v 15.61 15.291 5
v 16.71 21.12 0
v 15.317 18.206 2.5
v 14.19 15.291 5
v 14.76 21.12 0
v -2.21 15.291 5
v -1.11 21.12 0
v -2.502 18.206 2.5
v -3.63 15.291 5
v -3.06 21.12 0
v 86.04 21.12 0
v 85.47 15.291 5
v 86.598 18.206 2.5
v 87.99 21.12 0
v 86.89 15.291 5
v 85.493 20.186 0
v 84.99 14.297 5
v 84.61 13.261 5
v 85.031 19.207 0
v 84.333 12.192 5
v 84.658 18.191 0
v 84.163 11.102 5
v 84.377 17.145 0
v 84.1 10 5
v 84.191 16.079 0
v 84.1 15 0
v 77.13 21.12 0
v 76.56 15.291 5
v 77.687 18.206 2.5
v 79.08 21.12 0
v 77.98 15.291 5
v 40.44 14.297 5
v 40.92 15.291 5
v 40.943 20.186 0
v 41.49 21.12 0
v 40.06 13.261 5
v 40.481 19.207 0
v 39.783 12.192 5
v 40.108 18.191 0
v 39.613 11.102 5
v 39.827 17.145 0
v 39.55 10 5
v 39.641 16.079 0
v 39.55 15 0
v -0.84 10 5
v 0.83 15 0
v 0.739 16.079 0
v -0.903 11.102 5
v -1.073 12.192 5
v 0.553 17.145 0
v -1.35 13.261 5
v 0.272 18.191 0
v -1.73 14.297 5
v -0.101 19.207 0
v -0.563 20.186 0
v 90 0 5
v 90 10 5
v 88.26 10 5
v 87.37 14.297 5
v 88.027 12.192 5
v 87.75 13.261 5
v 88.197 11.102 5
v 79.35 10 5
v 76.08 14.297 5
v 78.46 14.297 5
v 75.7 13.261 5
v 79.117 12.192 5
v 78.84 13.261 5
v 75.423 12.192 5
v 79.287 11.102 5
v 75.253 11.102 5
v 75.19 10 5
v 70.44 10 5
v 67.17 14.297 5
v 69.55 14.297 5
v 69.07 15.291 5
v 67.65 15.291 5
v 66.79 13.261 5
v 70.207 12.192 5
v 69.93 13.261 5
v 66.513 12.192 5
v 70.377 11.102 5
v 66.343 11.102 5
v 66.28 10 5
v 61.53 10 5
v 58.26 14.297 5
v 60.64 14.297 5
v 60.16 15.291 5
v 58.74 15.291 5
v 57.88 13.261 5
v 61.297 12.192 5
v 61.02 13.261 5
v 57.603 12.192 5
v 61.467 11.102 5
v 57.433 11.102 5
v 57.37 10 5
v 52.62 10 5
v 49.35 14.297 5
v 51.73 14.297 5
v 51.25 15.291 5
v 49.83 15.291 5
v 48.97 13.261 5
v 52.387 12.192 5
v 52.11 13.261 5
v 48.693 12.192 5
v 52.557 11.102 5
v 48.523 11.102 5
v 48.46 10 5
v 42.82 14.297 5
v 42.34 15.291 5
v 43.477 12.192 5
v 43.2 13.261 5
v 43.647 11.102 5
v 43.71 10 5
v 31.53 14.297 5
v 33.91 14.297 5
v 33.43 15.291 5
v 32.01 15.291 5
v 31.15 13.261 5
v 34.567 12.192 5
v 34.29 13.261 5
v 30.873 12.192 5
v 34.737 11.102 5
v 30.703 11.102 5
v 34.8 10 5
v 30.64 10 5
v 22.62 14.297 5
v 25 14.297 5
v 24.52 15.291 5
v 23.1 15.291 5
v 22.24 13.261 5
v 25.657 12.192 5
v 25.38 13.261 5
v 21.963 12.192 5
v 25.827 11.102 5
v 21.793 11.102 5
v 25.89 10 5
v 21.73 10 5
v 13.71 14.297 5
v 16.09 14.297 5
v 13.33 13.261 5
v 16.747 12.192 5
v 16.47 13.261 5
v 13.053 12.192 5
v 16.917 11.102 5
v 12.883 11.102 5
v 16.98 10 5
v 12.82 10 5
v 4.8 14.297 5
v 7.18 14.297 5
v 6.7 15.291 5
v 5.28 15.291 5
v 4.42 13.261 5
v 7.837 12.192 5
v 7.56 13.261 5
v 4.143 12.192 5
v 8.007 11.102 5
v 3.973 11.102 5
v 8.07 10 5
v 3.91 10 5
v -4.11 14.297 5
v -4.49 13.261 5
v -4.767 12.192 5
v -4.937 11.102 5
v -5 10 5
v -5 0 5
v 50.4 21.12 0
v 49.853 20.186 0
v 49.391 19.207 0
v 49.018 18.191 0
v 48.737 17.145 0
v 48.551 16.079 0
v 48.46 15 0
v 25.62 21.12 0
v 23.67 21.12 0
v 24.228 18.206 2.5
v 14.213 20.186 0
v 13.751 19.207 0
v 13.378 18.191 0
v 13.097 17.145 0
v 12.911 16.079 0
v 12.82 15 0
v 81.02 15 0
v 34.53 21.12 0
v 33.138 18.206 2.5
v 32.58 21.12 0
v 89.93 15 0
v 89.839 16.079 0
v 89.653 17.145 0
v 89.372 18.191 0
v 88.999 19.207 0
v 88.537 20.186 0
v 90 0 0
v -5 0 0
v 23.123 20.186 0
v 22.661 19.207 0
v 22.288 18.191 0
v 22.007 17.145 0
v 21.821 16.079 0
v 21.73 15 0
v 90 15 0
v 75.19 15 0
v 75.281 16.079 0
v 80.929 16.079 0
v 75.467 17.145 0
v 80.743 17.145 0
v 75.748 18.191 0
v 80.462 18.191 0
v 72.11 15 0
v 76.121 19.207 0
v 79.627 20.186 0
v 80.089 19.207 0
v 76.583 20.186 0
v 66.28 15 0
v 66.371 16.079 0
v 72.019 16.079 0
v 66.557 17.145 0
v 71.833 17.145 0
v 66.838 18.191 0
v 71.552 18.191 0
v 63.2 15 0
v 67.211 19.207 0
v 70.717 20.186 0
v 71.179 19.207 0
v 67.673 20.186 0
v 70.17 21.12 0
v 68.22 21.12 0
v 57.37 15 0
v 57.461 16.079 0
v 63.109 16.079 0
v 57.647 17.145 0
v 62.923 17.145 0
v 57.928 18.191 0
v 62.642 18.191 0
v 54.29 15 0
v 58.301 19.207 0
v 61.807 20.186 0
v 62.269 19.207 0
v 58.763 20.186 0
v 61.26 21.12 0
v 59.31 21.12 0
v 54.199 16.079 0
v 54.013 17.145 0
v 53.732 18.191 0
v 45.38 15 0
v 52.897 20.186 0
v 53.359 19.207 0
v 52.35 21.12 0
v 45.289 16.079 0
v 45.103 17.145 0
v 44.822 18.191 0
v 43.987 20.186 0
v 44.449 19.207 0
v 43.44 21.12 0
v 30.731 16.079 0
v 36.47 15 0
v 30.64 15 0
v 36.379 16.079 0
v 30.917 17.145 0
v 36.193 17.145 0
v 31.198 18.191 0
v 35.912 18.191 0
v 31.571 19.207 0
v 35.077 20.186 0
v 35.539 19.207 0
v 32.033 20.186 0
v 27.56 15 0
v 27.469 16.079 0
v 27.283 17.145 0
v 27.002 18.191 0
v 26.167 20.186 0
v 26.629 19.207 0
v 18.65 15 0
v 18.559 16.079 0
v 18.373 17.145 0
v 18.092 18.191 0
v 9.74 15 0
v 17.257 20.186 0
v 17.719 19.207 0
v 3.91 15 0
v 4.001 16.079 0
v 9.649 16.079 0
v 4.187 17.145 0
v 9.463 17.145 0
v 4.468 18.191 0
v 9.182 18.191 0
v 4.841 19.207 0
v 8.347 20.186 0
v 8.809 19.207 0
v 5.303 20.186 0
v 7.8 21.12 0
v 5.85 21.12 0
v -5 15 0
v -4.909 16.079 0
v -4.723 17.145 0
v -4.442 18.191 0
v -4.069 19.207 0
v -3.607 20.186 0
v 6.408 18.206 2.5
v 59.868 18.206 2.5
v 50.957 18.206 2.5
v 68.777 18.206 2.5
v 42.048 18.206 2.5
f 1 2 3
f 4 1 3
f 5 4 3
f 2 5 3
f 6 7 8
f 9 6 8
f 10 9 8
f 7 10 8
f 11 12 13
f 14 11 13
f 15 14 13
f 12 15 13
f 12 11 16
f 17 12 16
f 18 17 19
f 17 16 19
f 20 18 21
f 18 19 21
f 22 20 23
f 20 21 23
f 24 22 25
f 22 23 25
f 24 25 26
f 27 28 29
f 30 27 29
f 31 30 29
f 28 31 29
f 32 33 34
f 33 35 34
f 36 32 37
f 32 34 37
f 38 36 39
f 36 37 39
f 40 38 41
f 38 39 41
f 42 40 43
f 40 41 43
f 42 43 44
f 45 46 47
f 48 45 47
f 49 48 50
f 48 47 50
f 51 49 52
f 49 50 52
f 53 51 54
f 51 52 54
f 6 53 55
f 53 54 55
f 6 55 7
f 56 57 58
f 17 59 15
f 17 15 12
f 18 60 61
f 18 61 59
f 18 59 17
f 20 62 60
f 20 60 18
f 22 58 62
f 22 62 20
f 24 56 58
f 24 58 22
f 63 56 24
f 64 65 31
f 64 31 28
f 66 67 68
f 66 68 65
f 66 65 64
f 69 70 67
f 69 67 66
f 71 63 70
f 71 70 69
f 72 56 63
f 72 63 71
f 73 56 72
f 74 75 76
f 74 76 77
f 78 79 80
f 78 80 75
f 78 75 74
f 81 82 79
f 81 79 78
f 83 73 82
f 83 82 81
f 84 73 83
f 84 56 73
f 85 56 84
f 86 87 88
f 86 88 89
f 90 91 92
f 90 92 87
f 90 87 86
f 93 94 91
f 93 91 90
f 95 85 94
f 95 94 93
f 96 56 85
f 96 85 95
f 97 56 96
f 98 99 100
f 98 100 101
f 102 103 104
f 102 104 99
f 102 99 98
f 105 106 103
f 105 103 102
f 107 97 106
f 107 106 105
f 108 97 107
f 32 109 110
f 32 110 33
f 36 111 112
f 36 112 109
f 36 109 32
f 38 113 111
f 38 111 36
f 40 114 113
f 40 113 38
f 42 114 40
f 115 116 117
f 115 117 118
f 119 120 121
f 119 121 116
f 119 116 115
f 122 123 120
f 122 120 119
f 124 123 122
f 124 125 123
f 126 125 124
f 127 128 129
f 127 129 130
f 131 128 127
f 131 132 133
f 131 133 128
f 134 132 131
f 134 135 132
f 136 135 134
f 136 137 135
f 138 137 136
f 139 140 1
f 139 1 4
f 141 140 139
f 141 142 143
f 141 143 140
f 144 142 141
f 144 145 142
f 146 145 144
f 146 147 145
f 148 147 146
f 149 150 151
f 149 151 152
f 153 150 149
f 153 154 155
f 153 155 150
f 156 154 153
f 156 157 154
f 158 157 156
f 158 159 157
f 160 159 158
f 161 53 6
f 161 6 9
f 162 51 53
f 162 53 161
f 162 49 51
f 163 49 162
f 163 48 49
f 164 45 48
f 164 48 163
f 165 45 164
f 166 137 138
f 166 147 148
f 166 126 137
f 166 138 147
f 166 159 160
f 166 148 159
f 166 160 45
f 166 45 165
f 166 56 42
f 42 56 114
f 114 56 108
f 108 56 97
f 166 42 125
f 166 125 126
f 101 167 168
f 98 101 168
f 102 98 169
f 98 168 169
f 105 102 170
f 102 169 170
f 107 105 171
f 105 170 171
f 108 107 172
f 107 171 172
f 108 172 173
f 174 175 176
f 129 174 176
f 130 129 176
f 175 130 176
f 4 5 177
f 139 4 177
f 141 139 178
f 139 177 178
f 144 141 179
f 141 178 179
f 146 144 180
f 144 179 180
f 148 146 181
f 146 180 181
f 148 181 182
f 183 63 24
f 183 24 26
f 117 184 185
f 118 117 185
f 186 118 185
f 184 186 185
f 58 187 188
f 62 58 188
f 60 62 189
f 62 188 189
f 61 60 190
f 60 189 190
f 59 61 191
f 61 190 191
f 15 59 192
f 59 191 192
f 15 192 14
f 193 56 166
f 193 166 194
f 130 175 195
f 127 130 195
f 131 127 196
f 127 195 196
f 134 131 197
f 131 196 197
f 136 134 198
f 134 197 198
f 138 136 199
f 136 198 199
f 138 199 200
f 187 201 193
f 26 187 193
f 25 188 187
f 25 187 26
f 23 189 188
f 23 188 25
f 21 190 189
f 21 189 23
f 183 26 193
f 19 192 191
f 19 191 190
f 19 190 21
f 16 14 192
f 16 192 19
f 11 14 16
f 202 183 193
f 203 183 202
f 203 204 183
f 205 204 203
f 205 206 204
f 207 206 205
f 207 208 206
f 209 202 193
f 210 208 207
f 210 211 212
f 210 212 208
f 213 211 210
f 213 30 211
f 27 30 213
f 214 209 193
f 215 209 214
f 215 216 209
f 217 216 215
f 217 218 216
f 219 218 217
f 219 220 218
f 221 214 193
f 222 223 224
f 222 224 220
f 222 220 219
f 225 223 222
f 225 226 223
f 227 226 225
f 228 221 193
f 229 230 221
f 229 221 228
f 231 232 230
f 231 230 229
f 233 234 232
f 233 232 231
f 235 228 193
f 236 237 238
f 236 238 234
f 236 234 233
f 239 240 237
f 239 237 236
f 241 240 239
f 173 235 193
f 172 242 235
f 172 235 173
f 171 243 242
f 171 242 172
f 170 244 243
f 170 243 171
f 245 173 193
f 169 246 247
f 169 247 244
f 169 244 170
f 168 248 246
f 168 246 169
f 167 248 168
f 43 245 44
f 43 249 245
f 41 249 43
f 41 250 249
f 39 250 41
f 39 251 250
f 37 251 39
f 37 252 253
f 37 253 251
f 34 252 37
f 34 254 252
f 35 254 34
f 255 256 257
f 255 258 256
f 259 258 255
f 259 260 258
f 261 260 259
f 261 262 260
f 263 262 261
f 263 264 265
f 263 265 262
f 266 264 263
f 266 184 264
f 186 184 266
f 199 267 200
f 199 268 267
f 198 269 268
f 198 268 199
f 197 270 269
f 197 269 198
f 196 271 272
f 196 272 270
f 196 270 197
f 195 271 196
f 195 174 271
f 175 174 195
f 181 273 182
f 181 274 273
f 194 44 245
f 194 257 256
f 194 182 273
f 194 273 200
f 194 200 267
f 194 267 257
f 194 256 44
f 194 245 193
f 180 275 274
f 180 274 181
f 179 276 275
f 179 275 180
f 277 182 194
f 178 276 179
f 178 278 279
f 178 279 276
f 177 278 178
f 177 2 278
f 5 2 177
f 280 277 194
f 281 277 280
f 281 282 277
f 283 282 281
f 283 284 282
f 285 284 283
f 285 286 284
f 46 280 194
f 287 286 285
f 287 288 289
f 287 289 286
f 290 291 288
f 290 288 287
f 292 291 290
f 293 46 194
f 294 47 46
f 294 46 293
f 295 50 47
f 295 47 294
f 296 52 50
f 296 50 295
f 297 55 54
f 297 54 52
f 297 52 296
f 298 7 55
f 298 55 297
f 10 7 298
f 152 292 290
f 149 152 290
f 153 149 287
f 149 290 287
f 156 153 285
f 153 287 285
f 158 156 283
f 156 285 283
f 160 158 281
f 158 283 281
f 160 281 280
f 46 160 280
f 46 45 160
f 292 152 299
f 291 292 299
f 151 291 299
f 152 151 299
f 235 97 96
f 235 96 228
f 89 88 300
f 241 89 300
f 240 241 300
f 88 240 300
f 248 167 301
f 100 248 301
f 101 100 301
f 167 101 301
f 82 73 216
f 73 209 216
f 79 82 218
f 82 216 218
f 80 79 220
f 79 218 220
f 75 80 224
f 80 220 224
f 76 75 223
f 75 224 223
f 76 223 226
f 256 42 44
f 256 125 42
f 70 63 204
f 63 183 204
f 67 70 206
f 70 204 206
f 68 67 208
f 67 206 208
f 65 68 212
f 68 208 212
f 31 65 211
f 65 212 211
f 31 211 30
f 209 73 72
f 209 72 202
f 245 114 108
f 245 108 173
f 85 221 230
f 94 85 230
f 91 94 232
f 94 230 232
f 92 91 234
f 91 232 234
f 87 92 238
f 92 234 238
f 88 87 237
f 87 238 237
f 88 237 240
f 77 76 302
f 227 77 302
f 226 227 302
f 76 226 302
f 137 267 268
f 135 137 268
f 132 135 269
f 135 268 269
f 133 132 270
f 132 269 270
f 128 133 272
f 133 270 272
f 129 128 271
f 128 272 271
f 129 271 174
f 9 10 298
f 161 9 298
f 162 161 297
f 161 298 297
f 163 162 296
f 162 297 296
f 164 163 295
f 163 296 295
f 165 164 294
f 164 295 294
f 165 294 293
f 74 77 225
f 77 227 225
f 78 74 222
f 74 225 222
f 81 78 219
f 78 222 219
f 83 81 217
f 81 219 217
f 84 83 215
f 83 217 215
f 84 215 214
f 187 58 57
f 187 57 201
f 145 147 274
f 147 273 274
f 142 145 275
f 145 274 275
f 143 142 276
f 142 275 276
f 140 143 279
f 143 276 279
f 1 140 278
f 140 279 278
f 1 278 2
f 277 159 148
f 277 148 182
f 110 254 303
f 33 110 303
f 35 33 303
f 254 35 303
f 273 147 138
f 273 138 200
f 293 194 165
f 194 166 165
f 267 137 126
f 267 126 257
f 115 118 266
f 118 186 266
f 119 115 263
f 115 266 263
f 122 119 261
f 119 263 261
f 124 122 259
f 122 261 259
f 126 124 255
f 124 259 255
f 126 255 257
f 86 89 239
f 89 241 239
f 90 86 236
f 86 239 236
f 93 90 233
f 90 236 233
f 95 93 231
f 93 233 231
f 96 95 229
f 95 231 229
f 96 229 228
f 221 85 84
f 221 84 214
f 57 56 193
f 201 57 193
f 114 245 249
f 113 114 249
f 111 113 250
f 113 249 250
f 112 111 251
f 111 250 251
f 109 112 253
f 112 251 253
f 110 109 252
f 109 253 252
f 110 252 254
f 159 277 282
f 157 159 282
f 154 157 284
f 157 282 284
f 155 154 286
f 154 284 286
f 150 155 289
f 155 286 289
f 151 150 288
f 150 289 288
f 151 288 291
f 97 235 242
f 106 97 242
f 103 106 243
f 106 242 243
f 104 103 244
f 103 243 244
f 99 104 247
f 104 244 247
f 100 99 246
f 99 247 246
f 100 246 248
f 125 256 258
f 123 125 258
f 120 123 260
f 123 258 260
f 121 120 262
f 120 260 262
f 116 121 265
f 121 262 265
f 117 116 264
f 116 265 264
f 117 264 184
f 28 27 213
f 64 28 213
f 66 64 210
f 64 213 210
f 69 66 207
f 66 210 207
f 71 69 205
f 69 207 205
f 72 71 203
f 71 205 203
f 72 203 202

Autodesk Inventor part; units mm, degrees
ref_plane "YZ Plane" through (0, 0, 0) normal (1, 0, 0) x (0, 1, 0)
ref_plane "XZ Plane" through (0, 0, 0) normal (0, 1, 0) x (-1, 0, 0)
ref_plane "XY Plane" through (0, 0, 0) normal (0, 0, 1) x (1, 0, 0)
sketch "Sketch1" plane through (0, 0, 0) normal (1, 0, 0) x (0, 1, 0)
  line L0 (0, 0) -> (15, 0)
  line L1 (15, 0) -> (15, 5)
  line L2 (15, 5) -> (0, 5)
  line L3 (0, 5) -> (0, 0)
  line L4 (10, 5) -> (15, 0)
  dimension "d0" = 15
  dimension "d1" = 5
  dimension "d2" = 5
extrude "Extrusion1" add sketch "Sketch1" along normal blind 90 and the other way blind 5 contours L3 L2 L4 L0
sketch "Sketch2" plane through (-5, 0, 5) normal (0, 0, 1) x (1, 0, 0)
  arc A0 (0, 10) -> (0, -10) centre (0, 0) ccw construction
  arc A1 (-9.7813, 2.08) -> (-9.7813, -2.08) centre (0, 0) ccw construction
  arc A2 (-15.2728, 0.745) -> (-15.2761, -0.675) centre (0, 0) ccw construction
  arc A3 (-15.2761, -0.675) -> (-9.7813, -2.08) centre (-9.8343, 9.1599) ccw construction
  arc A4 (-9.7813, 2.08) -> (-15.2728, 0.745) centre (-9.9572, -9.1586) ccw construction
  line L0 (0, 10) -> (4.16, 10)
  line L1 (0, 10) -> (95, 10) projected
  line L2 (1.37, 15.291) -> (2.79, 15.291)
  arc A5 (1.37, 15.291) -> (0, 10) centre (11.2397, 9.9126) ccw
  arc A6 (4.16, 10) -> (2.79, 15.291) centre (-7.0797, 9.9126) ccw
  point P0 (5, 0)
  point P1 (2.08, 10)
  dimension "d7" = 4.16
  dimension "d8" = 2.08
  dimension "d9" = 0.745
  dimension "d10" = 1.42
  dimension "d12" = 11.24
  dimension "d13" = 11.24
  dimension "d14" = 5.291
  dimension "d15" = 4.16
  dimension "d16" = 4.16
  dimension "d17" = 1.42
  dimension "d18" = 0.71
  dimension "d19" = 5.291
  dimension "d20" = 11.24
  dimension "d21" = 11.24
sketch "Sketch3" plane through (90, 15, 0) normal (0, 0, -1) x (-1, 0, 0)
  arc A0 (0, 1.075) -> (0, -1.075) centre (0, 0) ccw
  arc A1 (-14.714, 2.915) -> (-14.714, -2.915) centre (0, 0) ccw
  arc A2 (-21.0975, 0.975) -> (-21.0975, -0.975) centre (0, 0) ccw
  arc A3 (-21.0975, -0.975) -> (-14.714, -2.915) centre (-14.5146, 9.2134) ccw
  arc A4 (-14.714, 2.915) -> (-21.0975, 0.975) centre (-14.5146, -9.2134) ccw
  arc A5 (0, 1.075) -> (0, -1.075) centre (0, 0) ccw
  arc A6 (-14.714, 2.915) -> (-14.714, -2.915) centre (0, 0) ccw
  arc A7 (-21.0975, 0.975) -> (-21.0975, -0.975) centre (0, 0) ccw
  arc A8 (-21.0975, -0.975) -> (-14.714, -2.915) centre (-14.5146, 9.2134) ccw
  arc A9 (-14.714, 2.915) -> (-21.0975, 0.975) centre (-14.5146, -9.2134) ccw
  line L0 (0, 0) -> (95, 0) projected
  line L1 (95, 0) -> (89.17, 0)
  line L2 (91.11, 6.12) -> (93.06, 6.12)
  arc A10 (91.11, 6.12) -> (89.17, 0) centre (101.2907, -0.4747) ccw
  arc A11 (95, 0) -> (93.06, 6.12) centre (82.8793, -0.4747) ccw
  point P0 (90, -15)
  point P1 (0, -15)
  point P2 (0, -15)
  point P3 (92.085, 0)
  dimension "d22" = 2.915
  dimension "d23" = 5.83
  dimension "d24" = 0.975
  dimension "d25" = 1.95
  dimension "d26" = 21.12
  dimension "d27" = 12.13
  dimension "d28" = 12.13
  dimension "d29" = 2.915
  dimension "d30" = 5.83
  dimension "d31" = 0.975
  dimension "d32" = 1.95
  dimension "d33" = 21.12
  dimension "d34" = 12.13
  dimension "d35" = 12.13
  dimension "d36" = 5.83
  dimension "d37" = 5.83
  dimension "d38" = 1.95
  dimension "d39" = 0.975
  dimension "d40" = 6.12
  dimension "d41" = 6.12
  dimension "d42" = 12.13
  dimension "d43" = 12.13
loft "Loft1" add profiles "Sketch2", "Sketch3" contours all / A10 L2 A11 L0
pattern_linear "Rectangular Pattern1" count 11 spacing 8.91 along (1, 0, 0) of "Loft1"
properties part number "lockPin"
